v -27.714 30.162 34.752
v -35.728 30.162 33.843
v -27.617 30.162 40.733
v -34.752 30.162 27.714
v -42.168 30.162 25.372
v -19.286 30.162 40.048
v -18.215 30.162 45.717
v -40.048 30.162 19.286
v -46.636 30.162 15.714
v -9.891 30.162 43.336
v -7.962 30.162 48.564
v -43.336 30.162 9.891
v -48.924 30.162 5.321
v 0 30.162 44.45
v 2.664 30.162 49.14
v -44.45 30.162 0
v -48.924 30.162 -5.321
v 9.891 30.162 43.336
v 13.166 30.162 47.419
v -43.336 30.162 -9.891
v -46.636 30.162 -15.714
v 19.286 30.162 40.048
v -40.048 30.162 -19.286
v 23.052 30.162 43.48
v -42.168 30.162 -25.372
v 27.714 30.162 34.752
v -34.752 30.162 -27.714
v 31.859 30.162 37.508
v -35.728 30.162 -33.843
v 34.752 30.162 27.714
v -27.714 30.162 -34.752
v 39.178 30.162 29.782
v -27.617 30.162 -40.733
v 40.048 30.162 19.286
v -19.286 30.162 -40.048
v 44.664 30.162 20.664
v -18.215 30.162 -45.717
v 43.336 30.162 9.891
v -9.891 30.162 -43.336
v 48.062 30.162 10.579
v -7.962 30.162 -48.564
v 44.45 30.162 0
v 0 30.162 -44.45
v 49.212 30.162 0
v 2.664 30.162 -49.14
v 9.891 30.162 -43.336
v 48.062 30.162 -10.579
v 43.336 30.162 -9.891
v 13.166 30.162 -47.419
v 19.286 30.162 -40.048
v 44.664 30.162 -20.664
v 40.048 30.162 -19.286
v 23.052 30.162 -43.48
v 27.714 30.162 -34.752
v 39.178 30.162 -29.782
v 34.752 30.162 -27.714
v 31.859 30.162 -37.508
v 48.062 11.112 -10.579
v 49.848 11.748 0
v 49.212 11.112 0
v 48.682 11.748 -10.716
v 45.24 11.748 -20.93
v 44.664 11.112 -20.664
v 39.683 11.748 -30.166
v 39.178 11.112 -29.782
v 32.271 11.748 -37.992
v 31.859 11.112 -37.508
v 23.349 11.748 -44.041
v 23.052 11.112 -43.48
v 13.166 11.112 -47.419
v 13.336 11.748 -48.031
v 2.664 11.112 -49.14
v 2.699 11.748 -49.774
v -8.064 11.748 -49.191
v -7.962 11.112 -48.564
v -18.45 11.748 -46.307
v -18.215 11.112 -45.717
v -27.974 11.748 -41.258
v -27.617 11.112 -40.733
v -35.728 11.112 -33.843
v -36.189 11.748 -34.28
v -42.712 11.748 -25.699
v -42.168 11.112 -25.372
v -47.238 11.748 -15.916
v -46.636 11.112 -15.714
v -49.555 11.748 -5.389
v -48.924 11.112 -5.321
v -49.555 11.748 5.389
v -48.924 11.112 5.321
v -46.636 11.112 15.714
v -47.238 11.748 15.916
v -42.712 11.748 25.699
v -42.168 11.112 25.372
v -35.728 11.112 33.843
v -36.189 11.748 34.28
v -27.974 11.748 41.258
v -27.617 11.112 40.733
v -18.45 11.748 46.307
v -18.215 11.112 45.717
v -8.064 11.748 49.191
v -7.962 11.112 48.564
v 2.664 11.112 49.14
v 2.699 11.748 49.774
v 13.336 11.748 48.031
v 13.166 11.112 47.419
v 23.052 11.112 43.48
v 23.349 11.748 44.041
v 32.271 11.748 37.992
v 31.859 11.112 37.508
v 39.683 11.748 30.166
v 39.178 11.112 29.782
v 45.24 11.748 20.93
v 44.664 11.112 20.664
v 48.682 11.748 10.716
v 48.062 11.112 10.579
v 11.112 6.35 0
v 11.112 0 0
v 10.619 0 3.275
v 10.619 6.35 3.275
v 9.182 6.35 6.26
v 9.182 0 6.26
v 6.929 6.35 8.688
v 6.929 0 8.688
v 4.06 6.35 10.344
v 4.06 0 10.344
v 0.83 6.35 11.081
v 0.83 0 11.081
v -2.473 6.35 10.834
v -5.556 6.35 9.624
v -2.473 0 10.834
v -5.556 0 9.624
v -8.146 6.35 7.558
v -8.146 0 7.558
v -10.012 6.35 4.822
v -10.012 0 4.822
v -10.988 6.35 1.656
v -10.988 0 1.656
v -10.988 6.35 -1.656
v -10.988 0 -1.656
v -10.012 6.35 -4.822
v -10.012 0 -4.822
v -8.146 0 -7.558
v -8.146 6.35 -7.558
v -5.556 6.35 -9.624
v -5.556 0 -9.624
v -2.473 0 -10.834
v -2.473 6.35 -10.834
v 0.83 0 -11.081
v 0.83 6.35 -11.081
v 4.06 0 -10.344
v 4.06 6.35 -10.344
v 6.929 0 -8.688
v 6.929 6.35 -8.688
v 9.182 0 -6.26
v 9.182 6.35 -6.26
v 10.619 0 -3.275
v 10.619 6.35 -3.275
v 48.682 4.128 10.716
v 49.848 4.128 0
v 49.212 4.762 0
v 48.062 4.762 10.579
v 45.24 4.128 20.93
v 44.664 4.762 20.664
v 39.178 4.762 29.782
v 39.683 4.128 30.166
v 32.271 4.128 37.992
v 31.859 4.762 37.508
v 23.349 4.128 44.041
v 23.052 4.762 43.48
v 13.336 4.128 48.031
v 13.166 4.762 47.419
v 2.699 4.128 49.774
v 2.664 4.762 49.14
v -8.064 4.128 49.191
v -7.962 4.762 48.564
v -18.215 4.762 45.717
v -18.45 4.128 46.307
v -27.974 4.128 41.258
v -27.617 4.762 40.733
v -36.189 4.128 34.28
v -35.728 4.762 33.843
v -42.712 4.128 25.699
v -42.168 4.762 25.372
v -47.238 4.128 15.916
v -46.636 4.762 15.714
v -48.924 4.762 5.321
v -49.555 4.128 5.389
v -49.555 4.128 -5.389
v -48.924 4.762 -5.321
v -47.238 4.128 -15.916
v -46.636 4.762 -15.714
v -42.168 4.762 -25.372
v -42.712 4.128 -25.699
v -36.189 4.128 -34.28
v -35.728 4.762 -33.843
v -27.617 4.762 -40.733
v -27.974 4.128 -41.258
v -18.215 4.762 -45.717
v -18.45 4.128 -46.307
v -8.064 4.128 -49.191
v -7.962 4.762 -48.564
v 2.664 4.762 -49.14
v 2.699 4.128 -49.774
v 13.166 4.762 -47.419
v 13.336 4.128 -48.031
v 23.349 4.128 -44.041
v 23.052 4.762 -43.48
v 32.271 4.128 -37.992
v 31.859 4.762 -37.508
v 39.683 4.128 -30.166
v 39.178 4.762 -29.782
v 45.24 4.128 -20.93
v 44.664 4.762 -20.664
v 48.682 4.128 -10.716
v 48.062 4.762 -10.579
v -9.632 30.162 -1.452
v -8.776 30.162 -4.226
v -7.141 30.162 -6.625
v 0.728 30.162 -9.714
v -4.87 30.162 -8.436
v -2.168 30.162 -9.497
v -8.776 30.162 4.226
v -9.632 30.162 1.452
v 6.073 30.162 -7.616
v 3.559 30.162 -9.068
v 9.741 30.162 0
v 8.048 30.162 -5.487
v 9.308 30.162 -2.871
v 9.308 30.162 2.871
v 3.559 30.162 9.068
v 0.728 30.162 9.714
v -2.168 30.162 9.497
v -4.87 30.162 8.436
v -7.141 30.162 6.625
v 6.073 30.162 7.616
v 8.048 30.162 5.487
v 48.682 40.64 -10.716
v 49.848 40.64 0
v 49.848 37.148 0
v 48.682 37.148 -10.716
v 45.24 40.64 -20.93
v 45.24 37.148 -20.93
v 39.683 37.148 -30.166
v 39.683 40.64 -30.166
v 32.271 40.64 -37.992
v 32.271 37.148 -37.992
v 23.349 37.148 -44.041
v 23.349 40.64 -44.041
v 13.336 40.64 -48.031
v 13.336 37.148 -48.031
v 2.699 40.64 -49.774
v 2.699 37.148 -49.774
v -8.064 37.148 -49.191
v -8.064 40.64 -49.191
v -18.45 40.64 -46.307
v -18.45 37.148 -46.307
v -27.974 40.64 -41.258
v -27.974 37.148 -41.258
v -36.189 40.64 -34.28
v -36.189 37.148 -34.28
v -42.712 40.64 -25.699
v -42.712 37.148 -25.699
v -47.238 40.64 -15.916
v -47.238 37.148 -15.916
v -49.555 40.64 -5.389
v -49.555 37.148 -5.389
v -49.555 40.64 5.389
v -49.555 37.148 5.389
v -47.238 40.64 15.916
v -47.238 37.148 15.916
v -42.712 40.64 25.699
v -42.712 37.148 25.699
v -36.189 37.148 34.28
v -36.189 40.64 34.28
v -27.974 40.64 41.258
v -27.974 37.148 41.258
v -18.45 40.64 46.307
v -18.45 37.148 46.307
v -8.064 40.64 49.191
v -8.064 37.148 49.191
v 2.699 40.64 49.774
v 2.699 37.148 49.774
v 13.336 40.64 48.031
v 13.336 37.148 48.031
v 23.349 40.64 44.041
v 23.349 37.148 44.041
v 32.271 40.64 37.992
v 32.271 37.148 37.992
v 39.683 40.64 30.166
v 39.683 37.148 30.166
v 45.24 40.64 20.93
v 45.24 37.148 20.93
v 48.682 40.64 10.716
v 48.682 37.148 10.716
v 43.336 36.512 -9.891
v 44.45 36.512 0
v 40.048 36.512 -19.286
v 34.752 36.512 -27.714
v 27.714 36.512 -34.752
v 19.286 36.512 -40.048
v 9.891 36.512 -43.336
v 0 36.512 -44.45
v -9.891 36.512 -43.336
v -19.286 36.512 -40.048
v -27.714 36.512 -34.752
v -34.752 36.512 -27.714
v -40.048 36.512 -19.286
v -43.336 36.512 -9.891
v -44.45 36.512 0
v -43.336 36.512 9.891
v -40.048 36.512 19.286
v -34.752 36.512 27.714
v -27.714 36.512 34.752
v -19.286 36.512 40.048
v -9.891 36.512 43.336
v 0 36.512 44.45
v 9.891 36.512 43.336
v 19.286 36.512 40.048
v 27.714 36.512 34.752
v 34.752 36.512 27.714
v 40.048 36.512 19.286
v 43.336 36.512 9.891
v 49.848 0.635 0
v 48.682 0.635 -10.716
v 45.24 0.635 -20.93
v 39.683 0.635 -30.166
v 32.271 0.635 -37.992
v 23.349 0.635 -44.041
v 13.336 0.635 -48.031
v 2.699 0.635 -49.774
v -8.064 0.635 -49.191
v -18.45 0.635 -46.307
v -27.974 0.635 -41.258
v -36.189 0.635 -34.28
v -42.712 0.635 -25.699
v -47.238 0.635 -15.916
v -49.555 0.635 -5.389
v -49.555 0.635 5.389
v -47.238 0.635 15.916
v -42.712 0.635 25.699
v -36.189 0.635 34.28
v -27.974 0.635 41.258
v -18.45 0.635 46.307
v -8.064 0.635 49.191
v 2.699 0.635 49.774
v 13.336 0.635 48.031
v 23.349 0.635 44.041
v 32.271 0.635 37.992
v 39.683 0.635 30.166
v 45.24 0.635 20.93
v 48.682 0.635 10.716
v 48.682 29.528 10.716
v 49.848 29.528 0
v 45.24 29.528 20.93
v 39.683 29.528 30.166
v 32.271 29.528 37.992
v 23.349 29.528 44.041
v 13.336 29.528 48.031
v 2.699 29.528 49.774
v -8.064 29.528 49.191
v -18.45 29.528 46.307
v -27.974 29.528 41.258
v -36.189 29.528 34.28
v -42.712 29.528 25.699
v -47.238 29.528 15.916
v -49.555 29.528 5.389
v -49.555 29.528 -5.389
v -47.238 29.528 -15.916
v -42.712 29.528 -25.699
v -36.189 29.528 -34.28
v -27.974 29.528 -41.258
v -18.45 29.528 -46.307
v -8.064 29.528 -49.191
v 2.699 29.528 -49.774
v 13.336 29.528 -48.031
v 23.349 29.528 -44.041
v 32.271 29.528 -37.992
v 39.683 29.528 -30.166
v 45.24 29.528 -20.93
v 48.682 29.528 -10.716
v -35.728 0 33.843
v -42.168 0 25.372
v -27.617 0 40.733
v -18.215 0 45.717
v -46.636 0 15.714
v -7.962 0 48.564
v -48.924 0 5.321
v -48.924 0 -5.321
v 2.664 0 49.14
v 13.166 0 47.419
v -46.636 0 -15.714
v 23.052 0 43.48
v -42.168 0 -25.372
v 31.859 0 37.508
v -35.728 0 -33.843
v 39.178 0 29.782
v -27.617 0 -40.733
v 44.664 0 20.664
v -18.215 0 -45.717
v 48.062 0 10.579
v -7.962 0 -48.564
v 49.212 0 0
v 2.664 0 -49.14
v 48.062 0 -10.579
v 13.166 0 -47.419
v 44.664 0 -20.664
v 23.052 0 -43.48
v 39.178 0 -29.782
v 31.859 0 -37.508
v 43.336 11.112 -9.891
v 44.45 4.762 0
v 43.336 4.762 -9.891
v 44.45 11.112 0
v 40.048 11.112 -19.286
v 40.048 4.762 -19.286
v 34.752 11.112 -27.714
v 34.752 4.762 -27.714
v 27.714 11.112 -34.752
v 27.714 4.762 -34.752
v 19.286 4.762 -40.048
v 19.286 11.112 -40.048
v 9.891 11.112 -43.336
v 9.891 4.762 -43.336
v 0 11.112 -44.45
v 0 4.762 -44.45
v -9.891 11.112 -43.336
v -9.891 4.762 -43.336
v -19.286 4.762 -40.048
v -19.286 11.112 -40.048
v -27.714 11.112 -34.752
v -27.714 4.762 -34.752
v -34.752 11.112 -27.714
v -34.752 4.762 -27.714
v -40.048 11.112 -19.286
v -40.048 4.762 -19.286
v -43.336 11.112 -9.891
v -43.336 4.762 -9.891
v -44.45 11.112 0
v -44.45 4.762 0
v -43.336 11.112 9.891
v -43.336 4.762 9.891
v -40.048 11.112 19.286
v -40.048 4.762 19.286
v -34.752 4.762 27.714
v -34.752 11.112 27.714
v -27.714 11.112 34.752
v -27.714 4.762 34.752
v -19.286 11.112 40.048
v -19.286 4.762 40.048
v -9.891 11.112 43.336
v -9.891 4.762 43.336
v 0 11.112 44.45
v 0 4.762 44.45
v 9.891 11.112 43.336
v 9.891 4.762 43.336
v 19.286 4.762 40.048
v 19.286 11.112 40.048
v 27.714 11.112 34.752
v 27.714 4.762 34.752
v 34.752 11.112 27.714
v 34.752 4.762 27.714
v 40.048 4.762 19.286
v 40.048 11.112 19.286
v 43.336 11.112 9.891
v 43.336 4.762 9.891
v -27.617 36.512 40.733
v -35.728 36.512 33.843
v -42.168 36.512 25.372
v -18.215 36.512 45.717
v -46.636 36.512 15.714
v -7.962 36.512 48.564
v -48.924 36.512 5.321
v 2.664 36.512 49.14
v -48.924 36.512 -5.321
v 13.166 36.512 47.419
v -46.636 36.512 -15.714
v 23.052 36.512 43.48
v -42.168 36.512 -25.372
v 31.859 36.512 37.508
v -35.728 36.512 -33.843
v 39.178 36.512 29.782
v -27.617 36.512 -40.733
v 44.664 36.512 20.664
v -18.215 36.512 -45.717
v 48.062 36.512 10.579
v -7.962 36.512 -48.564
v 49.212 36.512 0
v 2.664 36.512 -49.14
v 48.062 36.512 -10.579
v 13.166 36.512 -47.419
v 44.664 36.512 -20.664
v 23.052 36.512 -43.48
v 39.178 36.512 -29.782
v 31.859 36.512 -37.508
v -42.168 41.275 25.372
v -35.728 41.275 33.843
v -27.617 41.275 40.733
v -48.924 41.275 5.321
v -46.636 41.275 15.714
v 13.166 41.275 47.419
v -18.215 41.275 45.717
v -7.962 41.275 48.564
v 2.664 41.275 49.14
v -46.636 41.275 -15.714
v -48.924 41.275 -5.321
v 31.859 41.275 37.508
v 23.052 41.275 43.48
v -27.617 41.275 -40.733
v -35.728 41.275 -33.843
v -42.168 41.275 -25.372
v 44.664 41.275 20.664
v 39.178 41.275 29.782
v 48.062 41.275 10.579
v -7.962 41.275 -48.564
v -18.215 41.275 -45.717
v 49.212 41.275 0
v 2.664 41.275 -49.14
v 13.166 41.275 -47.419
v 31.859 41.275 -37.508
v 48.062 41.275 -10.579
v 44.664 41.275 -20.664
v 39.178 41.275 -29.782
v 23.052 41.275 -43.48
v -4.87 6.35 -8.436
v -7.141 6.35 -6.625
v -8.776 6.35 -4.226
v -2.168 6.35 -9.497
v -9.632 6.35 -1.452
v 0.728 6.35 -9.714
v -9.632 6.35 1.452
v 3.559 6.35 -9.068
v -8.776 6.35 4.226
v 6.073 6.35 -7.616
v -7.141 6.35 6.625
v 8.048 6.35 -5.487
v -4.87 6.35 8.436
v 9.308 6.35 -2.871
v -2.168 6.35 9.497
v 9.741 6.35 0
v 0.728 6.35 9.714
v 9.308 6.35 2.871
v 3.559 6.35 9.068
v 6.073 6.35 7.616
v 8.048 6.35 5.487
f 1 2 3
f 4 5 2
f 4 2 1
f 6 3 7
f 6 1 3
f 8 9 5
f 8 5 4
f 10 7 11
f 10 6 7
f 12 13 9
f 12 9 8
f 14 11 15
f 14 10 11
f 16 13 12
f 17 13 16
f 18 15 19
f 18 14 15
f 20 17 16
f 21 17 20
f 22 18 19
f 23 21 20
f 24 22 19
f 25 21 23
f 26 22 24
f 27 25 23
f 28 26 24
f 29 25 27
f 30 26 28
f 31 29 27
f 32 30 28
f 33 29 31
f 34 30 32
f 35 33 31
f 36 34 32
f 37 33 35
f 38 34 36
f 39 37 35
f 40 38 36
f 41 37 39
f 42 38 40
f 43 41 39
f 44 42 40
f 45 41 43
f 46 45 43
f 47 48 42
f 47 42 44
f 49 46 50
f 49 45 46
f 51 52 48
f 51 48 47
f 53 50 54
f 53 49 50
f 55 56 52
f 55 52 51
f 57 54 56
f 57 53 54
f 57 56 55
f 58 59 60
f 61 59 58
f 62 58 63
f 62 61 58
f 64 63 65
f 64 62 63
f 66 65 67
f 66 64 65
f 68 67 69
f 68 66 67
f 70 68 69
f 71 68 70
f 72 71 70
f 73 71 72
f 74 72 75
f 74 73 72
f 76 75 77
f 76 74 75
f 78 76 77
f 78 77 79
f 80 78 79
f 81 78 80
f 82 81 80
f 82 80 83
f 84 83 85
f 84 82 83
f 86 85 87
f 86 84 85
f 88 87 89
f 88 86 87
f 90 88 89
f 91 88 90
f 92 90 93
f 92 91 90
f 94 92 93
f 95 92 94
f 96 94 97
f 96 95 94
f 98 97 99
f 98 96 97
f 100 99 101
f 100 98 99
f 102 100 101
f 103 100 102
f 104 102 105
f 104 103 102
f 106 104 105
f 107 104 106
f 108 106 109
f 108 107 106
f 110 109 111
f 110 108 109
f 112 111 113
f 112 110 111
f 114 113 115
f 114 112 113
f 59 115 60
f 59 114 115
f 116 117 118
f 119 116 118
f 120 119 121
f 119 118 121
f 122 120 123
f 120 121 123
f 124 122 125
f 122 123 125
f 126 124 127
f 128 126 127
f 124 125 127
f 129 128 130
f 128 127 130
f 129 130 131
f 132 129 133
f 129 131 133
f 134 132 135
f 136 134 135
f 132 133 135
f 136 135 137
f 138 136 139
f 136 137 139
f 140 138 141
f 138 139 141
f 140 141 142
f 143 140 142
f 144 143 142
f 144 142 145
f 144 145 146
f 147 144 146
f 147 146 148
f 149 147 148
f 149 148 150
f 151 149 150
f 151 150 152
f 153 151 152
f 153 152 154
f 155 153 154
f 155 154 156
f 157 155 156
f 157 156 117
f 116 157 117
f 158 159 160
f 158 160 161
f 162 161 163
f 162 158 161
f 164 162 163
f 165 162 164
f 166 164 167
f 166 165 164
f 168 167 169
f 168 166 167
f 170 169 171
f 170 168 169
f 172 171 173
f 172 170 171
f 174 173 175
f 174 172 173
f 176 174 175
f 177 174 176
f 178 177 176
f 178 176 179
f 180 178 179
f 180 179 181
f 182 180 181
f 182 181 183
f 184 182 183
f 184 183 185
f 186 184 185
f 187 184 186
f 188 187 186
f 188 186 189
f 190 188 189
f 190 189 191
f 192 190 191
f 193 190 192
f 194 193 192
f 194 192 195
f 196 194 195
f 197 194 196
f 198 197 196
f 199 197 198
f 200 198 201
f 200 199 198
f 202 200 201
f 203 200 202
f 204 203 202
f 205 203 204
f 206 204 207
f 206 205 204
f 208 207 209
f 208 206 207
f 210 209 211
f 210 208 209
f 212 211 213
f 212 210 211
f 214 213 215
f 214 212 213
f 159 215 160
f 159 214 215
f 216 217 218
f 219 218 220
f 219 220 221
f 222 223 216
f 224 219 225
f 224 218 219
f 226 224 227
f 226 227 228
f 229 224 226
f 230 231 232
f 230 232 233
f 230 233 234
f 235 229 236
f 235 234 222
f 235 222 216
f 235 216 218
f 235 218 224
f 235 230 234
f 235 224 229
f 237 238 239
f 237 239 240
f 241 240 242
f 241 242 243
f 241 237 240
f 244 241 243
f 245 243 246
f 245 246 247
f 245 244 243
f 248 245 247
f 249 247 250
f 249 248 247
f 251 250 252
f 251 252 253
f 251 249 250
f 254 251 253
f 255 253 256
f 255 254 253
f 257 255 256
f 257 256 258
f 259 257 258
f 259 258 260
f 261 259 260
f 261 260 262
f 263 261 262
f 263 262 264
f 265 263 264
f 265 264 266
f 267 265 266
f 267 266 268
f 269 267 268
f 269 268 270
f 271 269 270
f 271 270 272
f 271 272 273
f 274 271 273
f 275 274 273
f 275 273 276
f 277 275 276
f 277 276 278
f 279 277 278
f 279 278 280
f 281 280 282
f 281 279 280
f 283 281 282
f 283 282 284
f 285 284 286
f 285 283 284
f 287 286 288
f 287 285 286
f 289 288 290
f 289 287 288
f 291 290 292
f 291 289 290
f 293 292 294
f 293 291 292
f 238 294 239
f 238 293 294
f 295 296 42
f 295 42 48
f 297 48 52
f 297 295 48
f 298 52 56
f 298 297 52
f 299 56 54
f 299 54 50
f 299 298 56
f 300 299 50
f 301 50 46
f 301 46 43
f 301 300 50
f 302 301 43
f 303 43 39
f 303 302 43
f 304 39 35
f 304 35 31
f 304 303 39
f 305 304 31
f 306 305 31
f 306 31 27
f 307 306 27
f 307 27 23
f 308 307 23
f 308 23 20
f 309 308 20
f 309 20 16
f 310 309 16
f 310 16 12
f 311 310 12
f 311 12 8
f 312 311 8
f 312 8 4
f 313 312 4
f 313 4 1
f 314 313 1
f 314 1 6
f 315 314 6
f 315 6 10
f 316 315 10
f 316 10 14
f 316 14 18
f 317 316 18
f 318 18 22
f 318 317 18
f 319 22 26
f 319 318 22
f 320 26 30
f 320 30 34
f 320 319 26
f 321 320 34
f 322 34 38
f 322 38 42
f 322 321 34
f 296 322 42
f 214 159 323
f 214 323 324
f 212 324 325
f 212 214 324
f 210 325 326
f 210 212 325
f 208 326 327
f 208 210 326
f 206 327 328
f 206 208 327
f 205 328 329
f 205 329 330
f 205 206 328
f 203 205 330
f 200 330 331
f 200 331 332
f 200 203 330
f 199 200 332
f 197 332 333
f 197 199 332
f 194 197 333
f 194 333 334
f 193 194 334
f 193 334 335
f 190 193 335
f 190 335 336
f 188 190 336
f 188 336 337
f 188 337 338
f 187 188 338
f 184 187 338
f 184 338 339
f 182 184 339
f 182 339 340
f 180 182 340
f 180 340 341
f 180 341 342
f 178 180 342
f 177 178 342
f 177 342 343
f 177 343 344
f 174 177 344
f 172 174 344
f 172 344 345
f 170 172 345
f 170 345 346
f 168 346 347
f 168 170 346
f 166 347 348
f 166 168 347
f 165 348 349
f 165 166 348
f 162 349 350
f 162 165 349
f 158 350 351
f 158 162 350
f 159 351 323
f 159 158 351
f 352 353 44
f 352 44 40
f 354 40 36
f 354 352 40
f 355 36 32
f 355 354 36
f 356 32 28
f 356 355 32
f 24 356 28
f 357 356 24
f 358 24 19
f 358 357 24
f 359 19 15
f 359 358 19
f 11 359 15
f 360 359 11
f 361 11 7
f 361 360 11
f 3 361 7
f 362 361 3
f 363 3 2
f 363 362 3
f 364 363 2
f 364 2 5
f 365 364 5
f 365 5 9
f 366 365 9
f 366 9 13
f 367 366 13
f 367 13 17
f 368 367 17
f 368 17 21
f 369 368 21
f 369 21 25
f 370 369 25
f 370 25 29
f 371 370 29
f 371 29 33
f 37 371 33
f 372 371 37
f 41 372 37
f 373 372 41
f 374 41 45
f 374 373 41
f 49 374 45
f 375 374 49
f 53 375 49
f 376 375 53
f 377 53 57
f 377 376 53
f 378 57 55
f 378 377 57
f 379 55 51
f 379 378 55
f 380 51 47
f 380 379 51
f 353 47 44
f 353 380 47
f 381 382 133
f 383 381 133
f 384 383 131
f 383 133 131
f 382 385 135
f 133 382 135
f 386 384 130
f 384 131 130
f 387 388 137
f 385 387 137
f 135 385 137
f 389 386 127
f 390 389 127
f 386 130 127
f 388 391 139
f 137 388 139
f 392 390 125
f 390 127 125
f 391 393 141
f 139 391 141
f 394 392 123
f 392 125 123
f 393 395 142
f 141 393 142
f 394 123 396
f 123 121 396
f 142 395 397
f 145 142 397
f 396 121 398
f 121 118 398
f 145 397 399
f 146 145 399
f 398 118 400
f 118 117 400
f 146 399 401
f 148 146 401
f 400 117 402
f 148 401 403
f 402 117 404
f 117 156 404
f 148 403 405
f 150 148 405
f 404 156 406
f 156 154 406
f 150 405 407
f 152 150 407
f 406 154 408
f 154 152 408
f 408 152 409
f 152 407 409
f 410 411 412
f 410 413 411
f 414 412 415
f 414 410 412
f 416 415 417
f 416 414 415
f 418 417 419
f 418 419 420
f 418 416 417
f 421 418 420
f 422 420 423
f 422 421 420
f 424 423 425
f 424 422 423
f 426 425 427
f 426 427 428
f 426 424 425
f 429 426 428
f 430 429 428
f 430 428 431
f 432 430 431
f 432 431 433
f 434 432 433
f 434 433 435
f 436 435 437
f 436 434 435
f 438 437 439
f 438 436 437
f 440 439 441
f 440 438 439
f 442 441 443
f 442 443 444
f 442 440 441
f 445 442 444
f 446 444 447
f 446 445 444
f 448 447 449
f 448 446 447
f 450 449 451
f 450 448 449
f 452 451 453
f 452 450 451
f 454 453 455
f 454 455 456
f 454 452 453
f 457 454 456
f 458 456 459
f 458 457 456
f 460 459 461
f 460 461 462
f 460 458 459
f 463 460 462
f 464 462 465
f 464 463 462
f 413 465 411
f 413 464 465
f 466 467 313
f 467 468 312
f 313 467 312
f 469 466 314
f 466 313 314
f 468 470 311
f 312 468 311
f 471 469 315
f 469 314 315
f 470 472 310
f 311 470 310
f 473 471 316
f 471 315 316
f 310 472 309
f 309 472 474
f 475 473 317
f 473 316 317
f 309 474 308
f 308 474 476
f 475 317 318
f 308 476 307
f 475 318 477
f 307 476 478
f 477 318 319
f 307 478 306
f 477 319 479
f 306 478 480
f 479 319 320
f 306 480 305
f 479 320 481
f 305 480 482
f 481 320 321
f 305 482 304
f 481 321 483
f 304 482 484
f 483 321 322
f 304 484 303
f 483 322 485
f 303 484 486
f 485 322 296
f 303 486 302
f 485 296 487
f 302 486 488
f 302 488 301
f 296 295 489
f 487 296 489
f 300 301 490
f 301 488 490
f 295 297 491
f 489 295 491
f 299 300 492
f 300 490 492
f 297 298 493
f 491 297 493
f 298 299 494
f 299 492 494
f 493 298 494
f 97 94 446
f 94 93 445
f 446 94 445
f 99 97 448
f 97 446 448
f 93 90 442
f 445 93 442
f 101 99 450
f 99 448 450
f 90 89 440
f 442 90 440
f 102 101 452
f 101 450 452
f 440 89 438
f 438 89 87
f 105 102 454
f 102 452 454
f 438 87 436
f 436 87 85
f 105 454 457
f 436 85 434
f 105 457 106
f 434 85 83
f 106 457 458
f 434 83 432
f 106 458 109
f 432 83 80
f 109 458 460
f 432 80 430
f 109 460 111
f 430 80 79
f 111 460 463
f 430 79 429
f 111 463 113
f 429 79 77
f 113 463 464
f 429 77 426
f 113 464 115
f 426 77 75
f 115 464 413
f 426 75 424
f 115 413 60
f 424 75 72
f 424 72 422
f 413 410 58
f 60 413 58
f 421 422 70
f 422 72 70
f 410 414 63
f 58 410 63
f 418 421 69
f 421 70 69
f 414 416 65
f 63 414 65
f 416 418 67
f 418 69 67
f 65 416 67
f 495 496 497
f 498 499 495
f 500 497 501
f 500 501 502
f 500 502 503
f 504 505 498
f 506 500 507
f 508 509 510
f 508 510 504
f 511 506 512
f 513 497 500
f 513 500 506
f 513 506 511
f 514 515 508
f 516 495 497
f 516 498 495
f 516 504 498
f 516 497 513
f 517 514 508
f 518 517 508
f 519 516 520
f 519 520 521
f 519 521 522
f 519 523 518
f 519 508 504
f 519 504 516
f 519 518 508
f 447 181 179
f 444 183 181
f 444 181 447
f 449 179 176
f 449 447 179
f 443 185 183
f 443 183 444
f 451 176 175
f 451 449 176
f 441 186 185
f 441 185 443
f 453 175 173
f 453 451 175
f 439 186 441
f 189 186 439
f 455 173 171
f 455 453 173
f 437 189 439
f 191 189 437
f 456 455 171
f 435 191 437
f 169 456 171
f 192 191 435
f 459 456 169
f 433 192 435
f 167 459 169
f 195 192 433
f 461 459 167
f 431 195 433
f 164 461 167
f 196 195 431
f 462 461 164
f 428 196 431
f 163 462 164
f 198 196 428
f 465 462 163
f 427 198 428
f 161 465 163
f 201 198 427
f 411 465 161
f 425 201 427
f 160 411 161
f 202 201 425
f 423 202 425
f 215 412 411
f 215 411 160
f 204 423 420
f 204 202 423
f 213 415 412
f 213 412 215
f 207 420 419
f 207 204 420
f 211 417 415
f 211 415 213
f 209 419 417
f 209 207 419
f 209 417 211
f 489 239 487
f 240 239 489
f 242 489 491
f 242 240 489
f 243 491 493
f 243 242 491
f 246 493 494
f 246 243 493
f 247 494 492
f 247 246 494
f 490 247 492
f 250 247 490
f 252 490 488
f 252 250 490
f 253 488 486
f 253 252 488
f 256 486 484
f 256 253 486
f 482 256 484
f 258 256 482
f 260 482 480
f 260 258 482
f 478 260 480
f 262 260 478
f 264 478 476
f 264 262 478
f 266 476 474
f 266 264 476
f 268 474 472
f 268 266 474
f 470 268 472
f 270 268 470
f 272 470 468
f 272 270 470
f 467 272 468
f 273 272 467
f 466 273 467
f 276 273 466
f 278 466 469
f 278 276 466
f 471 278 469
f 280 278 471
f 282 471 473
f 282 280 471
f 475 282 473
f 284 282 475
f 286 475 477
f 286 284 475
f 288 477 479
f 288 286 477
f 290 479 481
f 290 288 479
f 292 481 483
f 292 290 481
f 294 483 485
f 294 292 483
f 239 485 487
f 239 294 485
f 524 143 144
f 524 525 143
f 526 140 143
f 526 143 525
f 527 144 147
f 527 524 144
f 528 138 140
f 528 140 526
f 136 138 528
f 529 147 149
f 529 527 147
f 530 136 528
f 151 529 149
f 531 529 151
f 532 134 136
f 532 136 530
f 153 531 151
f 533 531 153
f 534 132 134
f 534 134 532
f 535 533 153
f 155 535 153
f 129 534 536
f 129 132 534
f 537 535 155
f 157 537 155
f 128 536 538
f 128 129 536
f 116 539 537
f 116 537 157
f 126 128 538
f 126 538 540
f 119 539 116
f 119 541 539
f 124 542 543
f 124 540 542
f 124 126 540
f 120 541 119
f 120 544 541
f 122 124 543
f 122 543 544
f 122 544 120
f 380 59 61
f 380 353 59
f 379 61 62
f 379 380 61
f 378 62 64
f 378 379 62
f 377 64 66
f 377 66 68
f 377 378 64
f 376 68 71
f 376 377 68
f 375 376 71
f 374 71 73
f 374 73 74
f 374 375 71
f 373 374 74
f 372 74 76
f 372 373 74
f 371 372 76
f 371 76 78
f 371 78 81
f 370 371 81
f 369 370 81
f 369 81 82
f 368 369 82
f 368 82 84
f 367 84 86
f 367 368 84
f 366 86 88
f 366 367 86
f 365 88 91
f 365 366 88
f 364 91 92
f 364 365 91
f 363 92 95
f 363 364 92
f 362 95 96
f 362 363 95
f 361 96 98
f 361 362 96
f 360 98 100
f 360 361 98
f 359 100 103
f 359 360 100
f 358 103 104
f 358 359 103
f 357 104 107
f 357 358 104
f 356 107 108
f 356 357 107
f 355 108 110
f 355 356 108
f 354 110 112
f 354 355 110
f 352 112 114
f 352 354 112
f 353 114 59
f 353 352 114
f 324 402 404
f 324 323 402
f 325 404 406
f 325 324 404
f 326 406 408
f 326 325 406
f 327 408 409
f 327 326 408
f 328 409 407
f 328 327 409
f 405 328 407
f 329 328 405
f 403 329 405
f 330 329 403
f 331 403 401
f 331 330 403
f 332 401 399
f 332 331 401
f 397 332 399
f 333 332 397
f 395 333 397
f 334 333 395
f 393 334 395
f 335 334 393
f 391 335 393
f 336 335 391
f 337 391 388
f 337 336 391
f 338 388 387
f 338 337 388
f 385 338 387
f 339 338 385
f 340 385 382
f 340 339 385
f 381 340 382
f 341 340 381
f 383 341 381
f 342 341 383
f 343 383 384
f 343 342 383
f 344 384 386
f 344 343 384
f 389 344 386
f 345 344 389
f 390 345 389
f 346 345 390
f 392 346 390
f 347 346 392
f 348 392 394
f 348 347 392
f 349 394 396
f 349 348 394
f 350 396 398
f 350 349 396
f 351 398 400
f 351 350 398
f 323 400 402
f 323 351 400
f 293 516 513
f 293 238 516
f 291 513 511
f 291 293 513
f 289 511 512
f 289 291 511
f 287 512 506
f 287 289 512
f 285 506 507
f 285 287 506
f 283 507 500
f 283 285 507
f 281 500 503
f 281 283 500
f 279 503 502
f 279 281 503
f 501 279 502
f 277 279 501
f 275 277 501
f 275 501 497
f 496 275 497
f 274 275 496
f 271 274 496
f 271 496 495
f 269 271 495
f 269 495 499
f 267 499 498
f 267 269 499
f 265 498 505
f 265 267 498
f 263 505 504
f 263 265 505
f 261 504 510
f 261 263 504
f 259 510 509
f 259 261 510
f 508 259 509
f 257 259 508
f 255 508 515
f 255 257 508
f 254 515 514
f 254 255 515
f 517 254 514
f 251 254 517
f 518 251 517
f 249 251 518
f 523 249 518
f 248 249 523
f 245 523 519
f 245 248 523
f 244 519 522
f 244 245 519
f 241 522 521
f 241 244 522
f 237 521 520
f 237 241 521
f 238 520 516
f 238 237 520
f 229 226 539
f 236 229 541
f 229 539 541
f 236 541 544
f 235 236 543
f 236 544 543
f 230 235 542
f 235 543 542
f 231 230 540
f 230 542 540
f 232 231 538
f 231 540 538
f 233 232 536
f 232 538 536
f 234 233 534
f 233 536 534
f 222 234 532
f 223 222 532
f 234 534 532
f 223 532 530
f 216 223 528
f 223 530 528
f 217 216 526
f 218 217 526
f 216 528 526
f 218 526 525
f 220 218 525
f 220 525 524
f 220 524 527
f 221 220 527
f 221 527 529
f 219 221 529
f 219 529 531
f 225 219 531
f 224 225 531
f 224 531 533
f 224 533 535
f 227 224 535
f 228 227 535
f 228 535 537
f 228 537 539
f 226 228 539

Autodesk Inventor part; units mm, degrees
ref_plane "YZ Plane" through (0, 0, 0) normal (1, 0, 0) x (0, 1, 0)
ref_plane "XZ Plane" through (0, 0, 0) normal (0, 1, 0) x (-1, 0, 0)
ref_plane "XY Plane" through (0, 0, 0) normal (0, 0, 1) x (1, 0, 0)
sketch "Sketch1" plane through (0, 0, 0) normal (0, 0, 1) x (1, 0, 0)
  line L0 (50.8, 0) -> (50.8, 39.0312) construction
  line L1 (0, 0) -> (49.8475, 0)
  line L2 (44.45, 0) -> (44.45, 51.6727)
  line L3 (0, 0) -> (0, 50.5742)
  line L4 (49.8475, 0) -> (49.8475, 45.6895)
  line L5 (49.8475, 4.7625) -> (44.45, 4.7625)
  line L6 (44.45, 11.1125) -> (49.8475, 11.1125)
  line L7 (49.8475, 30.1625) -> (44.45, 30.1625)
  line L8 (44.45, 36.5125) -> (49.8475, 36.5125)
  line L9 (49.8475, 41.275) -> (0, 41.275)
  point P0 (47.1487, 36.5125)
  point P1 (44.45, 30.1625)
  dimension "d1" = 49.8475
  dimension "d2" = 44.45
  dimension "d3" = 6.35
  dimension "d4" = 6.35
  dimension "d5" = 4.7625
  dimension "d6" = 19.05
  dimension "d7" = 4.7625
  dimension "d12" = 41.275
revolve "Revolution1" add sketch "Sketch1" angle 360 about axis through (0, 0, 0) along (0, 1, 0) contours L3 L9 L2 L1 | L2 L5 L4 L1 | L9 L4 L8 L2 | L2 L7 L4 L6
chamfer "Chamfer1" distance 0.635 angle 45 6 edges at (-49.8475, 0, 0) (-49.8475, 4.7625, 0) (-49.8475, 11.1125, 0) (-49.8475, 30.1625, 0) (-49.8475, 36.5125, 0) (-49.8475, 41.275, 0)
sketch "Sketch2" plane through (0, 0, 0) normal (0, -1, 0) x (1, 0, 0)
  circle A0 centre (0, 0) radius 9.7409
  circle A1 centre (0, 0) radius 11.1125
  dimension "d16" = 19.4818
  dimension "d17" = 22.225
extrude "Extrusion1" cut sketch "Sketch2" against normal up to surface (30.1625 mm away) contours A0
extrude "Extrusion2" cut sketch "Sketch2" against normal blind 6.35 contours A0 | A1
properties part number "2 Piston"
